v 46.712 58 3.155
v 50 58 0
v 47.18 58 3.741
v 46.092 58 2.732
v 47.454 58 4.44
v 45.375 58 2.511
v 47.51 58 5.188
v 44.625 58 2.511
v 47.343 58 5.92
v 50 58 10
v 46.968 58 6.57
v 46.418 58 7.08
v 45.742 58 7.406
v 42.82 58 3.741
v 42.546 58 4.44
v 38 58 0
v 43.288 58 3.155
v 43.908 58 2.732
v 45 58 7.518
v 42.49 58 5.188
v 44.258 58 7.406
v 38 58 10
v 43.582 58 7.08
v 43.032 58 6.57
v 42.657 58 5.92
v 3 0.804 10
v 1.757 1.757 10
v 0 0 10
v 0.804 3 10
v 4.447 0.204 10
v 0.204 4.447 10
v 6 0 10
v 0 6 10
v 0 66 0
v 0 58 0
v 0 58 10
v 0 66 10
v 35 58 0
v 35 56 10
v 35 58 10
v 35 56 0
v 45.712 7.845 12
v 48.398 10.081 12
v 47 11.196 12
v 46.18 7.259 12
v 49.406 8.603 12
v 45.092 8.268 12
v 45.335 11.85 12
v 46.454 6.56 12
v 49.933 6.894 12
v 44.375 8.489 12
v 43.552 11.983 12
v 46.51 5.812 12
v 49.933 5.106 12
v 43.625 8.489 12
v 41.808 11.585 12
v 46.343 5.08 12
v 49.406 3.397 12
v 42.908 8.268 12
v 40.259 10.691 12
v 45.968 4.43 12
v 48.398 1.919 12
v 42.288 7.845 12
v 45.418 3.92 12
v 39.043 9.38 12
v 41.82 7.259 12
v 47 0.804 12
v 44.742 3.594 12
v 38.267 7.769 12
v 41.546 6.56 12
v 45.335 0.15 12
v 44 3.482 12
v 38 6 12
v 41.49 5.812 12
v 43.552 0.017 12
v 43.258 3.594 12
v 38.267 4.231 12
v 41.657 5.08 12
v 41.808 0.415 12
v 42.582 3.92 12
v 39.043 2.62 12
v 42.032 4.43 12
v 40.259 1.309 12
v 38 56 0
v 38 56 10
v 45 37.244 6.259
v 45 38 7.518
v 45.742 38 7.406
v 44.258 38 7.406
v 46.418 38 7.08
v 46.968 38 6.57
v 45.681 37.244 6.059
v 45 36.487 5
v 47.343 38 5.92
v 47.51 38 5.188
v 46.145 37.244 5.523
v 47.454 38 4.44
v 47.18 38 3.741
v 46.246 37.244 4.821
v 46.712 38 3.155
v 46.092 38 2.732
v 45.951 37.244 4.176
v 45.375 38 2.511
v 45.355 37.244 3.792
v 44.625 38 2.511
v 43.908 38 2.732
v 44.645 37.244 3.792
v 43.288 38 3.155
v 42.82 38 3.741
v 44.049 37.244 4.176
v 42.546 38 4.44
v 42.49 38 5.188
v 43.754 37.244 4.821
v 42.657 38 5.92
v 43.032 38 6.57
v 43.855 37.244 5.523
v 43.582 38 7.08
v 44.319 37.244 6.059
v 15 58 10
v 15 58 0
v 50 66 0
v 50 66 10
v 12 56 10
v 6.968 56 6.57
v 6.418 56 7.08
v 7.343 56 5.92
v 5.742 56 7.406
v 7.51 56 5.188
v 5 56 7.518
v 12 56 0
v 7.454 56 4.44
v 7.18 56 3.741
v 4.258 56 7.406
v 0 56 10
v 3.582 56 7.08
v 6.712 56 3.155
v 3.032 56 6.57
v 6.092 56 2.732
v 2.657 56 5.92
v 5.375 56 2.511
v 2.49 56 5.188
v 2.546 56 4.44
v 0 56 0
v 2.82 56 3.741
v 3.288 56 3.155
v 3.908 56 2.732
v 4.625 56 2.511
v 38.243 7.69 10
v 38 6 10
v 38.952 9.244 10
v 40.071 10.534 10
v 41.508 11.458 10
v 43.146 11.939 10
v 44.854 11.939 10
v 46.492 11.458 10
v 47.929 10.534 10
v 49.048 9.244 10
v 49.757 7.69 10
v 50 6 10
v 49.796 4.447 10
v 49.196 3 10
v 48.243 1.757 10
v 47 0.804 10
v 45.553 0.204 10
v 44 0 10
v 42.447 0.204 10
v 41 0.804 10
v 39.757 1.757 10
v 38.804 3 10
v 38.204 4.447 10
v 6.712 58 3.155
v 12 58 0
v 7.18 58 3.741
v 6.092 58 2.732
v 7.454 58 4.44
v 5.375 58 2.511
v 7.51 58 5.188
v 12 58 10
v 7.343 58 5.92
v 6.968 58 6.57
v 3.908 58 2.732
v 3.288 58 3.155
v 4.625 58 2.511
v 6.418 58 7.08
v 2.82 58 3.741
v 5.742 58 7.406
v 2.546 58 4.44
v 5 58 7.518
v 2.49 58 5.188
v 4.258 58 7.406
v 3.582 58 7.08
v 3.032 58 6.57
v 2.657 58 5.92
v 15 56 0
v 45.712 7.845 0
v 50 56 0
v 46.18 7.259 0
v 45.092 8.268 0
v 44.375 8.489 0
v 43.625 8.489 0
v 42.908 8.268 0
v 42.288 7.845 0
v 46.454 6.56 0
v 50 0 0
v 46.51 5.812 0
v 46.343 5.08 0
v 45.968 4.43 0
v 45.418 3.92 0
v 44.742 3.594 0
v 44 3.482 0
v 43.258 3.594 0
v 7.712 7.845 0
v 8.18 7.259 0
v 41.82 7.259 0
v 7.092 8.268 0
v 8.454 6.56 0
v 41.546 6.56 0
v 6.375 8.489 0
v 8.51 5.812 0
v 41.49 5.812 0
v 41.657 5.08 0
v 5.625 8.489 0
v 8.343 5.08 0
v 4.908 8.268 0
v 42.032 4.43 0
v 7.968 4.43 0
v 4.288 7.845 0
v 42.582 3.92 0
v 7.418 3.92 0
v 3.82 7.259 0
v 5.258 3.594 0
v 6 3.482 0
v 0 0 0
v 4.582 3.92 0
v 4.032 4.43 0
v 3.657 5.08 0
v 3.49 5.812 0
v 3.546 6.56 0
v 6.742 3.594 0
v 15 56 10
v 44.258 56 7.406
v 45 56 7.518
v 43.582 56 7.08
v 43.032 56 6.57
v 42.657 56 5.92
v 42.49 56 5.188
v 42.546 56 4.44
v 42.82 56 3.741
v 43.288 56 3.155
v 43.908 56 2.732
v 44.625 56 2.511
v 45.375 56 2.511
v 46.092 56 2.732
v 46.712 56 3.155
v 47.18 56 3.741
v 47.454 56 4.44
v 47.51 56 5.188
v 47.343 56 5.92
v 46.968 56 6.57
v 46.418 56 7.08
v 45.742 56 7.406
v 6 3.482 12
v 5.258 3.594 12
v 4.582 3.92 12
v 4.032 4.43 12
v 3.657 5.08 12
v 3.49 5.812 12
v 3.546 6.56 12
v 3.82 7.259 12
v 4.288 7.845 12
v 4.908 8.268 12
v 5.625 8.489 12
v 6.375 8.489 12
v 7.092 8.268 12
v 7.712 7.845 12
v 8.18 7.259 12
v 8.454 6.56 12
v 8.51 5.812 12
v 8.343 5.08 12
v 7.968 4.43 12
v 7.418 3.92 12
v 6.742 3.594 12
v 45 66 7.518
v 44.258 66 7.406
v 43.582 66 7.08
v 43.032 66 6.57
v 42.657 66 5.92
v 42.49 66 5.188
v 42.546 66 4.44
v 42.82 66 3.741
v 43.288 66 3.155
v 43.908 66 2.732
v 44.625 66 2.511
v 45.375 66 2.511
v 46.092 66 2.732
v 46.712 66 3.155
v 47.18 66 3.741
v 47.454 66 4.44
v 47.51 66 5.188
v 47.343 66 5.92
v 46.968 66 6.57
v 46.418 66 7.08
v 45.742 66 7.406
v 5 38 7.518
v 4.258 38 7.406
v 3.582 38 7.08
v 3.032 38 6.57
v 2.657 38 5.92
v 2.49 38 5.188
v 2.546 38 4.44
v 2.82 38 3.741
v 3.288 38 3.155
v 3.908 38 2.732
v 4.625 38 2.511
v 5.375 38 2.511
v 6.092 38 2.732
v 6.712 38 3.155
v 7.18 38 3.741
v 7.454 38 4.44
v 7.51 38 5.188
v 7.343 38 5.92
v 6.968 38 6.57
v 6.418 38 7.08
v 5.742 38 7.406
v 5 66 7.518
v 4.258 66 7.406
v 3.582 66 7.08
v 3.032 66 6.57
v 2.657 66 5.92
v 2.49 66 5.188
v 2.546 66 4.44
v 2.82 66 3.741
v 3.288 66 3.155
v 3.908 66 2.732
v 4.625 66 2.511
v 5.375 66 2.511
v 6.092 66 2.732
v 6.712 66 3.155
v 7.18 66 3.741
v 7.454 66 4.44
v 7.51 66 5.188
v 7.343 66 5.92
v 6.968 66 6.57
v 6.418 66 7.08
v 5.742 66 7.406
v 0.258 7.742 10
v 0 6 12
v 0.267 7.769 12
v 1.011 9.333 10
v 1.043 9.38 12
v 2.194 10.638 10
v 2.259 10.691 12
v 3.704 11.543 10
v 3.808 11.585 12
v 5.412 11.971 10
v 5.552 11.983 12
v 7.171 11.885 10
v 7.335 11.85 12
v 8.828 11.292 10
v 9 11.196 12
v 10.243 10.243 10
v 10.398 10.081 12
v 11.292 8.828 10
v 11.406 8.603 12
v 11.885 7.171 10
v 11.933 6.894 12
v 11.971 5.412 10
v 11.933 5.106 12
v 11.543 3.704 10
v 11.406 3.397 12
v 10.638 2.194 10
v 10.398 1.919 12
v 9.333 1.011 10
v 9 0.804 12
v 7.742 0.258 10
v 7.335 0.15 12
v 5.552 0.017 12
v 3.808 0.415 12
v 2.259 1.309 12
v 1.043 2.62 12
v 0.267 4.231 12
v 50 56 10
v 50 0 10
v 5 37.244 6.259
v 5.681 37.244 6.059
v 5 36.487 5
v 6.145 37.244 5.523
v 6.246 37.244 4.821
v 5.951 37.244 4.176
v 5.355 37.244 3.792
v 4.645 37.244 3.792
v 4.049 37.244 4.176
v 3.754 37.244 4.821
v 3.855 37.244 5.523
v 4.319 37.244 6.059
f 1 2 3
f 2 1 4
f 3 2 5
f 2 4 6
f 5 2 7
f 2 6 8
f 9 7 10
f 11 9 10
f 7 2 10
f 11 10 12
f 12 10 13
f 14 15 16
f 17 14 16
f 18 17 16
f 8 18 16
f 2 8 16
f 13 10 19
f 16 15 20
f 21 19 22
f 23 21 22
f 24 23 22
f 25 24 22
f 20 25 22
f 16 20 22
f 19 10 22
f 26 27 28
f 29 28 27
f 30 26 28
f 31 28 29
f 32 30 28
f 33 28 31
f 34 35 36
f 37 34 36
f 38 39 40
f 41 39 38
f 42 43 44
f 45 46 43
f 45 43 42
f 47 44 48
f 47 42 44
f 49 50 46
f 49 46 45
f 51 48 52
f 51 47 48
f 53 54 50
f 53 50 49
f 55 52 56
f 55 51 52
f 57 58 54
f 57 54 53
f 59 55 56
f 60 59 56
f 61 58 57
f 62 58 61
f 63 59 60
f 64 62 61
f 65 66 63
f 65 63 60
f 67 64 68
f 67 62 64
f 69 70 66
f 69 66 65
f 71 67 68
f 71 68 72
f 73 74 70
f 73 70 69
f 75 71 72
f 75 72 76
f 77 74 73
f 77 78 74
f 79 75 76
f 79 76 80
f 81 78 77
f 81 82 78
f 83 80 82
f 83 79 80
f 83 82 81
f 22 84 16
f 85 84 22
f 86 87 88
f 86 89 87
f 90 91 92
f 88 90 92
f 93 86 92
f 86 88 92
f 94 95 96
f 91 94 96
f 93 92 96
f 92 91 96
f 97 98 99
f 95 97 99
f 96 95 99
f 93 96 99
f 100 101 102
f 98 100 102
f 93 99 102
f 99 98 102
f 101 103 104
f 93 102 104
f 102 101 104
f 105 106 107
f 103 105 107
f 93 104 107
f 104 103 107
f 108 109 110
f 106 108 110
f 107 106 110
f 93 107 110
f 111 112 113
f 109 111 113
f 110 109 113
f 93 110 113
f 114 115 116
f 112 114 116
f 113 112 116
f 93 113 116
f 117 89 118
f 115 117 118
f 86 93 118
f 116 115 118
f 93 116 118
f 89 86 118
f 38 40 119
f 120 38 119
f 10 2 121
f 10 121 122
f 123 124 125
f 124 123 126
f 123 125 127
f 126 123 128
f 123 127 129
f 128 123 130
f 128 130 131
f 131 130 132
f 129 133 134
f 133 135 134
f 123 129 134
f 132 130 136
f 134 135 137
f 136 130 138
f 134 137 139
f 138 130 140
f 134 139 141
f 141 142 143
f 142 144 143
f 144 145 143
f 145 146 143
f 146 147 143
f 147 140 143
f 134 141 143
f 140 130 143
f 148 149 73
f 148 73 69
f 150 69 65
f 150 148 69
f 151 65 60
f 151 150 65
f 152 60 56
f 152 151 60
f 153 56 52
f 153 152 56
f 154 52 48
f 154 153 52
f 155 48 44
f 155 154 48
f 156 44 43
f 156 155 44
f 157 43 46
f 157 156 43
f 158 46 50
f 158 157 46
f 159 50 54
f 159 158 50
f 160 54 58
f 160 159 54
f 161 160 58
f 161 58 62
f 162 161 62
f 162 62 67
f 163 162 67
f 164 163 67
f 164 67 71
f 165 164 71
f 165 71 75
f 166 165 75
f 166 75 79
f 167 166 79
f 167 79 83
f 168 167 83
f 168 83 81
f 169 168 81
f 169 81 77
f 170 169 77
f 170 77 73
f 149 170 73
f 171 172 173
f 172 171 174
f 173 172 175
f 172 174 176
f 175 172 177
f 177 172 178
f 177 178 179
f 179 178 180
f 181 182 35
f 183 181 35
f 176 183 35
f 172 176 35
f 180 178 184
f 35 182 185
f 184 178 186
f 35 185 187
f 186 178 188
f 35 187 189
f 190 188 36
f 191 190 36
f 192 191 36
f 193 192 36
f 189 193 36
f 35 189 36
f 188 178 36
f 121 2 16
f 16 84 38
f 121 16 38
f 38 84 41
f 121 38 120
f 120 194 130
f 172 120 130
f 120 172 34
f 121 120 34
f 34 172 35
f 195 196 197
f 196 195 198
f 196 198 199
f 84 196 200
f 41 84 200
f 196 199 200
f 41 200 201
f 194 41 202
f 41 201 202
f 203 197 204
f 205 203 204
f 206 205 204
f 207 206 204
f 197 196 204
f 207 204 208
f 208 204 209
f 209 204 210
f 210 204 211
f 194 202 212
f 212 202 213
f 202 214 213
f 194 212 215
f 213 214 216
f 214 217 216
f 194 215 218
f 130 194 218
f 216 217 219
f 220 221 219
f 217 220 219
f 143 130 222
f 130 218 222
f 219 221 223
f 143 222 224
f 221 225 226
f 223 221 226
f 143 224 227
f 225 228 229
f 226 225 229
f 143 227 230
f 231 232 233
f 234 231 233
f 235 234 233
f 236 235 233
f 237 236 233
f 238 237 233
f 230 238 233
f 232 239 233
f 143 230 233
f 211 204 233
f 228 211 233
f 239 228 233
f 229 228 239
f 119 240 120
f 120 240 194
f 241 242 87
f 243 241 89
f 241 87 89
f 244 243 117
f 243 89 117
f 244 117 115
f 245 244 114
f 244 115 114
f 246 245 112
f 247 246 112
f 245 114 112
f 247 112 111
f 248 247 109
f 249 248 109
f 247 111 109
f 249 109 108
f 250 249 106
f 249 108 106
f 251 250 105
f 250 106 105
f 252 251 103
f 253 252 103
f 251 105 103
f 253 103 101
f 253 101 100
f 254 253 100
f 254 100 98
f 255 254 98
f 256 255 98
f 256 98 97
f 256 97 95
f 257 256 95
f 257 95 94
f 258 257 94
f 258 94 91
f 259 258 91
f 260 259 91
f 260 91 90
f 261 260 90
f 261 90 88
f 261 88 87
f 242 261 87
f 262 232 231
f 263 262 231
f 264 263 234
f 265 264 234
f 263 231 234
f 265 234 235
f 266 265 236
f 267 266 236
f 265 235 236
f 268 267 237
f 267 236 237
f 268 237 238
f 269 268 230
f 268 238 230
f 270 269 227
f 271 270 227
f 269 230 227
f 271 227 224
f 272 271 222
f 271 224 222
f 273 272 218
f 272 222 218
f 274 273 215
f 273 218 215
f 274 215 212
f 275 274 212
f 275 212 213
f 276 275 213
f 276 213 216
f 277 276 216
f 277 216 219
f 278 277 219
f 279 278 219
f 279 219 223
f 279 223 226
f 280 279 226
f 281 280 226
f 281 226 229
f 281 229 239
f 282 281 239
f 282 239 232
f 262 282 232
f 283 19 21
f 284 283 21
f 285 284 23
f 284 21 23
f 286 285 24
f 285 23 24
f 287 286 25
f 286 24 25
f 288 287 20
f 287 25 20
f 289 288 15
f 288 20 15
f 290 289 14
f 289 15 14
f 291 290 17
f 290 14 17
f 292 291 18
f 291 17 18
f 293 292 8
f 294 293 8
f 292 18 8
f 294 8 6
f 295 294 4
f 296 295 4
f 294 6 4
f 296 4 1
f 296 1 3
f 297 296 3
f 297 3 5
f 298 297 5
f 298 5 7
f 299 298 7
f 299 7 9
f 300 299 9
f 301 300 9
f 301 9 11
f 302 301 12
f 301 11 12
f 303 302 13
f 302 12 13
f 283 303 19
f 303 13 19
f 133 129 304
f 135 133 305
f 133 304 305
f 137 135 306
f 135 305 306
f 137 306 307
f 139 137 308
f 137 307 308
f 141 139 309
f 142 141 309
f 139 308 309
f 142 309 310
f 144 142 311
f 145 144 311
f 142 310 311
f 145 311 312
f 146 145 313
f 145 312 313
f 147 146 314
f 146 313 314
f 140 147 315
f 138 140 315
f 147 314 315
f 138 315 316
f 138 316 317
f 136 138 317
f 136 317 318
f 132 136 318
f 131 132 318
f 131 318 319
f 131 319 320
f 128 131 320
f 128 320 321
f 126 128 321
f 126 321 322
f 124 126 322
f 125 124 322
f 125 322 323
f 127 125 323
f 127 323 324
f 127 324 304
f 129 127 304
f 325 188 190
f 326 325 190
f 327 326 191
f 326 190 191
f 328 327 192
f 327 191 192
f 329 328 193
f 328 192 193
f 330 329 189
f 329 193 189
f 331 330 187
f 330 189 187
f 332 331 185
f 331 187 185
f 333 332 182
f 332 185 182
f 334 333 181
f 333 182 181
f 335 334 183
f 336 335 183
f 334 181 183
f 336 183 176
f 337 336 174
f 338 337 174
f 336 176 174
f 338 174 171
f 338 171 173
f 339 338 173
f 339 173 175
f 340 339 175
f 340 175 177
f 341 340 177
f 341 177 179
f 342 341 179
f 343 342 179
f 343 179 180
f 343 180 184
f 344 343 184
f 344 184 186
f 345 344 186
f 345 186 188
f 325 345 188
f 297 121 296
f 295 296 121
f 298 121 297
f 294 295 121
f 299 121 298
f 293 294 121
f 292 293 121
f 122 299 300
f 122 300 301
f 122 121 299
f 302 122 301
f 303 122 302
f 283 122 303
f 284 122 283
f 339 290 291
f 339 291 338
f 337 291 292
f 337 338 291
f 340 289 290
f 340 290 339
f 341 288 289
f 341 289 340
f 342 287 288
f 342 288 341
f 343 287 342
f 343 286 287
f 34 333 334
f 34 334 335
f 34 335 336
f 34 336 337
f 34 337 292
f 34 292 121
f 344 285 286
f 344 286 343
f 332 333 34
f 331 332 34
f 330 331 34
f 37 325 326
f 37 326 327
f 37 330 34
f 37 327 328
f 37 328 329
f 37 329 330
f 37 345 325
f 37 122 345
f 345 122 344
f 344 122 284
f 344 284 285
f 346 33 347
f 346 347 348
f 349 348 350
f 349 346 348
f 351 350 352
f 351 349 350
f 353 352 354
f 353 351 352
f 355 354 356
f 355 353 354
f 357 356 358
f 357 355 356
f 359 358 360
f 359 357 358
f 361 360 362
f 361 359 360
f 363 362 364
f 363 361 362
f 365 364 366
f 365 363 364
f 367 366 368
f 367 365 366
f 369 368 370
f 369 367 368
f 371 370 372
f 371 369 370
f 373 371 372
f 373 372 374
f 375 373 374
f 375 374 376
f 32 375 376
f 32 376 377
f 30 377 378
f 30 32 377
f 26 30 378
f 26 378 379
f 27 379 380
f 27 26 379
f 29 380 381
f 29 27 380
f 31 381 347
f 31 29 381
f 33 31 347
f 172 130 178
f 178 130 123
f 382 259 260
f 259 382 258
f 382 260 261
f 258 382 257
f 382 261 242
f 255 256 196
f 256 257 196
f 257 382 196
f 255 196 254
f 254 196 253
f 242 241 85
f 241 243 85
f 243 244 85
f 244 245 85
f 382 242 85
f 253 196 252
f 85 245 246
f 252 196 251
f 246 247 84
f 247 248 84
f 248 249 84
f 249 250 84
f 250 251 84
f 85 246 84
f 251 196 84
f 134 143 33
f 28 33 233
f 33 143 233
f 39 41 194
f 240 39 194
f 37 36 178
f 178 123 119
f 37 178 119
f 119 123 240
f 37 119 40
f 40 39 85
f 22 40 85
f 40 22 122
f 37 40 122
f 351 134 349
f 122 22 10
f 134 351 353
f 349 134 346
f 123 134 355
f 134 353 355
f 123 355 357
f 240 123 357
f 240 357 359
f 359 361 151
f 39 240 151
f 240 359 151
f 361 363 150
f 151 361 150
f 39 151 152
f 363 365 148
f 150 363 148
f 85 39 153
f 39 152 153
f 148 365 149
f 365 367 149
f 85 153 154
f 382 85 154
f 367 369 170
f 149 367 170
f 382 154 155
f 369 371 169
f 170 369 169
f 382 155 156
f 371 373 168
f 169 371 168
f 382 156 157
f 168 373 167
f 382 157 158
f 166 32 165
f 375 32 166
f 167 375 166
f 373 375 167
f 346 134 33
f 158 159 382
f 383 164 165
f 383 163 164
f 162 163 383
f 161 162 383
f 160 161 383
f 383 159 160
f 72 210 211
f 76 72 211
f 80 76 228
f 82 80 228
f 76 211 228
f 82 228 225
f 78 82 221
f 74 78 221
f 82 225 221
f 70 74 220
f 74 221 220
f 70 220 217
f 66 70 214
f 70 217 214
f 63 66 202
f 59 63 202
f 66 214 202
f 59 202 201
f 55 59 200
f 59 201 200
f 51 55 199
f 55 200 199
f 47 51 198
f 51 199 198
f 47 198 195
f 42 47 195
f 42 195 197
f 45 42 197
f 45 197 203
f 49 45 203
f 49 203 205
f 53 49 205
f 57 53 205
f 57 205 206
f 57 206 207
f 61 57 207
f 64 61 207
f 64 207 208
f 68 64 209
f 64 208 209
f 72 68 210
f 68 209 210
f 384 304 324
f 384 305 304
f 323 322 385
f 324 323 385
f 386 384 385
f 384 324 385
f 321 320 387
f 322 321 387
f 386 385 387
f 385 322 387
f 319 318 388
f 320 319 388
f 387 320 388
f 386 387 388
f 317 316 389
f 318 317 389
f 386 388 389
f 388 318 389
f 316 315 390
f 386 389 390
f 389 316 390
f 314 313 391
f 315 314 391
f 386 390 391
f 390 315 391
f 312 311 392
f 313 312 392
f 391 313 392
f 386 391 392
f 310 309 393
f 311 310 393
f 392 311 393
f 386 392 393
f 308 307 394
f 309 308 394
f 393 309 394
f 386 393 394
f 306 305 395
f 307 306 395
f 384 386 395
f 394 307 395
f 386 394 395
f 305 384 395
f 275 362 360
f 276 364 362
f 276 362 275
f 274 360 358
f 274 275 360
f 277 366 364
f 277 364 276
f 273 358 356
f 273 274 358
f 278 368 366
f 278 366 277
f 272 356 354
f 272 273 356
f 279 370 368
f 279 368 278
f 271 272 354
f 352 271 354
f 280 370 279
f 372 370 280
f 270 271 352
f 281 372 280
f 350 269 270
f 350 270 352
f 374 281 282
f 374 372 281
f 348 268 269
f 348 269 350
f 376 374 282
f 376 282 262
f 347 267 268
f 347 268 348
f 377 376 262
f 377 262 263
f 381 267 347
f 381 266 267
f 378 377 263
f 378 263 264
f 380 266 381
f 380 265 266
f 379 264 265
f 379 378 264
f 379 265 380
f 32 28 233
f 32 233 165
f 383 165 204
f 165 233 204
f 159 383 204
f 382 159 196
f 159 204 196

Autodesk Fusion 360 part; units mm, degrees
sketch "Sketch1" plane through (0, 0, 0) normal (0, 0, 1) x (1, 0, 0)
  line L0 (0, 0) -> (50, 0)
  line L1 (50, 0) -> (50, 56)
  line L2 (50, 56) -> (0, 56)
  line L3 (0, 56) -> (0, 0)
  dimension "d1" = 50
  dimension "d2" = 56
extrude "Extrude1" add sketch "Sketch1" along normal blind 10
sketch "Sketch2" plane through (0, 0, 10) normal (0, 0, 1) x (-1, 0, 0)
  line L0 (0, -56) -> (0, 0)
  line L1 (0, 0) -> (-50, 0)
  line L2 (-50, 0) -> (-50, -56)
  line L3 (-50, -56) -> (0, -56)
  line L4 (0, 0) -> (-6, 0)
  line L5 (-6, 0) -> (-6, -6)
  circle A0 centre (-6, -6) radius 6
  line L6 (-50, 0) -> (-44, 0)
  line L7 (-44, 0) -> (-44, -6)
  circle A1 centre (-44, -6) radius 6
  dimension "d5" = 6
  dimension "d6" = 6
  dimension "d7" = 12
  dimension "d8" = 6
  dimension "d9" = 6
  dimension "d10" = 12
extrude "Extrude2" add sketch "Sketch2" along normal blind 2 contours A0 | A1
sketch "Sketch3" plane through (0, 0, 12) normal (0, 0, 1) x (-1, 0, 0)
  circle A0 centre (-6, -6) radius 6
  line L0 (-6, -6) -> (-12, -6)
sketch "Sketch4" plane through (0, 0, 12) normal (0, 0, 1) x (-1, 0, 0)
  circle A0 centre (-44, -6) radius 6
  line L0 (-44, -6) -> (-50, -6)
hole "Hole1" at (6, 6, 12) at (44, 6, 12) direction (0, 0, -1) diameter 5.035 depth 15 tip angle 118
sketch "Sketch5" plane through (0, 56, 0) normal (0, 1, 0) x (-1, 0, 0)
  line L0 (-50, 0) -> (0, 0)
  line L1 (0, 0) -> (0, 10)
  line L2 (0, 10) -> (-50, 10)
  line L3 (-50, 10) -> (-50, 0)
  line L4 (-50, 5) -> (-45, 5)
  line L5 (0, 5) -> (-5, 5)
  dimension "d23" = 5
  dimension "d24" = 5
hole "Hole3" at (45, 56, 5) at (5, 56, 5) direction (0, -1, 0) diameter 5.035 depth 18 tip angle 118
sketch "Sketch6" plane through (0, 56, 0) normal (0, 1, 0) x (-1, 0, 0)
  circle A0 centre (-45, 5) radius 2.5175
  circle A1 centre (-5, 5) radius 2.5175
  line L0 (-50, 0) -> (0, 0)
  line L1 (0, 0) -> (0, 10)
  line L2 (0, 10) -> (-50, 10)
  line L3 (-50, 10) -> (-50, 0)
  line L4 (-45, 5) -> (-35, 5)
  line L5 (-5, 5) -> (-15, 5)
  line L6 (-35, 5) -> (-35, 0)
  line L7 (-15, 5) -> (-15, 0)
  line L8 (-35, 0) -> (-38, 0)
  line L9 (-38, 0) -> (-38, 10)
  line L10 (-38, 10) -> (-35, 10)
  line L11 (-35, 10) -> (-35, 0)
  line L12 (-15, 0) -> (-12, 0)
  line L13 (-12, 0) -> (-12, 10)
  line L14 (-12, 10) -> (-15, 10)
  line L15 (-15, 10) -> (-15, 0)
  dimension "d28" = 10
  dimension "d29" = 10
  dimension "d30" = 3
  dimension "d31" = 3
extrude "Extrude3" add sketch "Sketch6" along normal blind 2 contours L2 L4 L9 L10 L11 | L0 L4 L6 L8 L9 L11 | L0 L5 L7 L12 L13 L15 | L2 L5 L13 L14 L15
sketch "Sketch7" plane through (0, 58, 0) normal (0, 1, 0) x (-1, 0, 0)
  line L0 (-35, 10) -> (-38, 10)
  line L1 (-38, 10) -> (-38, 0)
  line L2 (-38, 0) -> (-35, 0)
  line L3 (-35, 0) -> (-35, 10)
  line L4 (-35, 0) -> (-50, 0)
  line L5 (-50, 0) -> (-50, 10)
  line L6 (-50, 10) -> (-35, 10)
  line L7 (-35, 10) -> (-35, 0)
  line L8 (-35, 0) -> (0, 0)
  line L9 (0, 0) -> (0, 10)
  line L10 (0, 10) -> (-35, 10)
  line L11 (-35, 10) -> (-35, 0)
  dimension "d34" = 15
  dimension "d35" = 10
  dimension "d36" = 35
  dimension "d37" = 10
extrude "Extrude4" add sketch "Sketch7" along normal blind 8
sketch "Sketch8" plane through (0, 66, 0) normal (0, 1, 0) x (-1, 0, 0)
  line L0 (-50, 0) -> (0, 0)
  line L1 (0, 0) -> (0, 10)
  line L2 (0, 10) -> (-50, 10)
  line L3 (-50, 10) -> (-50, 0)
  line L4 (-50, 5) -> (-45, 5)
  line L5 (0, 5) -> (-5, 5)
  dimension "d40" = 5
  dimension "d41" = 5
hole "Hole4" at (45, 66, 5) at (5, 66, 5) direction (0, -1, 0) diameter 5.035 depth 28 tip angle 118
